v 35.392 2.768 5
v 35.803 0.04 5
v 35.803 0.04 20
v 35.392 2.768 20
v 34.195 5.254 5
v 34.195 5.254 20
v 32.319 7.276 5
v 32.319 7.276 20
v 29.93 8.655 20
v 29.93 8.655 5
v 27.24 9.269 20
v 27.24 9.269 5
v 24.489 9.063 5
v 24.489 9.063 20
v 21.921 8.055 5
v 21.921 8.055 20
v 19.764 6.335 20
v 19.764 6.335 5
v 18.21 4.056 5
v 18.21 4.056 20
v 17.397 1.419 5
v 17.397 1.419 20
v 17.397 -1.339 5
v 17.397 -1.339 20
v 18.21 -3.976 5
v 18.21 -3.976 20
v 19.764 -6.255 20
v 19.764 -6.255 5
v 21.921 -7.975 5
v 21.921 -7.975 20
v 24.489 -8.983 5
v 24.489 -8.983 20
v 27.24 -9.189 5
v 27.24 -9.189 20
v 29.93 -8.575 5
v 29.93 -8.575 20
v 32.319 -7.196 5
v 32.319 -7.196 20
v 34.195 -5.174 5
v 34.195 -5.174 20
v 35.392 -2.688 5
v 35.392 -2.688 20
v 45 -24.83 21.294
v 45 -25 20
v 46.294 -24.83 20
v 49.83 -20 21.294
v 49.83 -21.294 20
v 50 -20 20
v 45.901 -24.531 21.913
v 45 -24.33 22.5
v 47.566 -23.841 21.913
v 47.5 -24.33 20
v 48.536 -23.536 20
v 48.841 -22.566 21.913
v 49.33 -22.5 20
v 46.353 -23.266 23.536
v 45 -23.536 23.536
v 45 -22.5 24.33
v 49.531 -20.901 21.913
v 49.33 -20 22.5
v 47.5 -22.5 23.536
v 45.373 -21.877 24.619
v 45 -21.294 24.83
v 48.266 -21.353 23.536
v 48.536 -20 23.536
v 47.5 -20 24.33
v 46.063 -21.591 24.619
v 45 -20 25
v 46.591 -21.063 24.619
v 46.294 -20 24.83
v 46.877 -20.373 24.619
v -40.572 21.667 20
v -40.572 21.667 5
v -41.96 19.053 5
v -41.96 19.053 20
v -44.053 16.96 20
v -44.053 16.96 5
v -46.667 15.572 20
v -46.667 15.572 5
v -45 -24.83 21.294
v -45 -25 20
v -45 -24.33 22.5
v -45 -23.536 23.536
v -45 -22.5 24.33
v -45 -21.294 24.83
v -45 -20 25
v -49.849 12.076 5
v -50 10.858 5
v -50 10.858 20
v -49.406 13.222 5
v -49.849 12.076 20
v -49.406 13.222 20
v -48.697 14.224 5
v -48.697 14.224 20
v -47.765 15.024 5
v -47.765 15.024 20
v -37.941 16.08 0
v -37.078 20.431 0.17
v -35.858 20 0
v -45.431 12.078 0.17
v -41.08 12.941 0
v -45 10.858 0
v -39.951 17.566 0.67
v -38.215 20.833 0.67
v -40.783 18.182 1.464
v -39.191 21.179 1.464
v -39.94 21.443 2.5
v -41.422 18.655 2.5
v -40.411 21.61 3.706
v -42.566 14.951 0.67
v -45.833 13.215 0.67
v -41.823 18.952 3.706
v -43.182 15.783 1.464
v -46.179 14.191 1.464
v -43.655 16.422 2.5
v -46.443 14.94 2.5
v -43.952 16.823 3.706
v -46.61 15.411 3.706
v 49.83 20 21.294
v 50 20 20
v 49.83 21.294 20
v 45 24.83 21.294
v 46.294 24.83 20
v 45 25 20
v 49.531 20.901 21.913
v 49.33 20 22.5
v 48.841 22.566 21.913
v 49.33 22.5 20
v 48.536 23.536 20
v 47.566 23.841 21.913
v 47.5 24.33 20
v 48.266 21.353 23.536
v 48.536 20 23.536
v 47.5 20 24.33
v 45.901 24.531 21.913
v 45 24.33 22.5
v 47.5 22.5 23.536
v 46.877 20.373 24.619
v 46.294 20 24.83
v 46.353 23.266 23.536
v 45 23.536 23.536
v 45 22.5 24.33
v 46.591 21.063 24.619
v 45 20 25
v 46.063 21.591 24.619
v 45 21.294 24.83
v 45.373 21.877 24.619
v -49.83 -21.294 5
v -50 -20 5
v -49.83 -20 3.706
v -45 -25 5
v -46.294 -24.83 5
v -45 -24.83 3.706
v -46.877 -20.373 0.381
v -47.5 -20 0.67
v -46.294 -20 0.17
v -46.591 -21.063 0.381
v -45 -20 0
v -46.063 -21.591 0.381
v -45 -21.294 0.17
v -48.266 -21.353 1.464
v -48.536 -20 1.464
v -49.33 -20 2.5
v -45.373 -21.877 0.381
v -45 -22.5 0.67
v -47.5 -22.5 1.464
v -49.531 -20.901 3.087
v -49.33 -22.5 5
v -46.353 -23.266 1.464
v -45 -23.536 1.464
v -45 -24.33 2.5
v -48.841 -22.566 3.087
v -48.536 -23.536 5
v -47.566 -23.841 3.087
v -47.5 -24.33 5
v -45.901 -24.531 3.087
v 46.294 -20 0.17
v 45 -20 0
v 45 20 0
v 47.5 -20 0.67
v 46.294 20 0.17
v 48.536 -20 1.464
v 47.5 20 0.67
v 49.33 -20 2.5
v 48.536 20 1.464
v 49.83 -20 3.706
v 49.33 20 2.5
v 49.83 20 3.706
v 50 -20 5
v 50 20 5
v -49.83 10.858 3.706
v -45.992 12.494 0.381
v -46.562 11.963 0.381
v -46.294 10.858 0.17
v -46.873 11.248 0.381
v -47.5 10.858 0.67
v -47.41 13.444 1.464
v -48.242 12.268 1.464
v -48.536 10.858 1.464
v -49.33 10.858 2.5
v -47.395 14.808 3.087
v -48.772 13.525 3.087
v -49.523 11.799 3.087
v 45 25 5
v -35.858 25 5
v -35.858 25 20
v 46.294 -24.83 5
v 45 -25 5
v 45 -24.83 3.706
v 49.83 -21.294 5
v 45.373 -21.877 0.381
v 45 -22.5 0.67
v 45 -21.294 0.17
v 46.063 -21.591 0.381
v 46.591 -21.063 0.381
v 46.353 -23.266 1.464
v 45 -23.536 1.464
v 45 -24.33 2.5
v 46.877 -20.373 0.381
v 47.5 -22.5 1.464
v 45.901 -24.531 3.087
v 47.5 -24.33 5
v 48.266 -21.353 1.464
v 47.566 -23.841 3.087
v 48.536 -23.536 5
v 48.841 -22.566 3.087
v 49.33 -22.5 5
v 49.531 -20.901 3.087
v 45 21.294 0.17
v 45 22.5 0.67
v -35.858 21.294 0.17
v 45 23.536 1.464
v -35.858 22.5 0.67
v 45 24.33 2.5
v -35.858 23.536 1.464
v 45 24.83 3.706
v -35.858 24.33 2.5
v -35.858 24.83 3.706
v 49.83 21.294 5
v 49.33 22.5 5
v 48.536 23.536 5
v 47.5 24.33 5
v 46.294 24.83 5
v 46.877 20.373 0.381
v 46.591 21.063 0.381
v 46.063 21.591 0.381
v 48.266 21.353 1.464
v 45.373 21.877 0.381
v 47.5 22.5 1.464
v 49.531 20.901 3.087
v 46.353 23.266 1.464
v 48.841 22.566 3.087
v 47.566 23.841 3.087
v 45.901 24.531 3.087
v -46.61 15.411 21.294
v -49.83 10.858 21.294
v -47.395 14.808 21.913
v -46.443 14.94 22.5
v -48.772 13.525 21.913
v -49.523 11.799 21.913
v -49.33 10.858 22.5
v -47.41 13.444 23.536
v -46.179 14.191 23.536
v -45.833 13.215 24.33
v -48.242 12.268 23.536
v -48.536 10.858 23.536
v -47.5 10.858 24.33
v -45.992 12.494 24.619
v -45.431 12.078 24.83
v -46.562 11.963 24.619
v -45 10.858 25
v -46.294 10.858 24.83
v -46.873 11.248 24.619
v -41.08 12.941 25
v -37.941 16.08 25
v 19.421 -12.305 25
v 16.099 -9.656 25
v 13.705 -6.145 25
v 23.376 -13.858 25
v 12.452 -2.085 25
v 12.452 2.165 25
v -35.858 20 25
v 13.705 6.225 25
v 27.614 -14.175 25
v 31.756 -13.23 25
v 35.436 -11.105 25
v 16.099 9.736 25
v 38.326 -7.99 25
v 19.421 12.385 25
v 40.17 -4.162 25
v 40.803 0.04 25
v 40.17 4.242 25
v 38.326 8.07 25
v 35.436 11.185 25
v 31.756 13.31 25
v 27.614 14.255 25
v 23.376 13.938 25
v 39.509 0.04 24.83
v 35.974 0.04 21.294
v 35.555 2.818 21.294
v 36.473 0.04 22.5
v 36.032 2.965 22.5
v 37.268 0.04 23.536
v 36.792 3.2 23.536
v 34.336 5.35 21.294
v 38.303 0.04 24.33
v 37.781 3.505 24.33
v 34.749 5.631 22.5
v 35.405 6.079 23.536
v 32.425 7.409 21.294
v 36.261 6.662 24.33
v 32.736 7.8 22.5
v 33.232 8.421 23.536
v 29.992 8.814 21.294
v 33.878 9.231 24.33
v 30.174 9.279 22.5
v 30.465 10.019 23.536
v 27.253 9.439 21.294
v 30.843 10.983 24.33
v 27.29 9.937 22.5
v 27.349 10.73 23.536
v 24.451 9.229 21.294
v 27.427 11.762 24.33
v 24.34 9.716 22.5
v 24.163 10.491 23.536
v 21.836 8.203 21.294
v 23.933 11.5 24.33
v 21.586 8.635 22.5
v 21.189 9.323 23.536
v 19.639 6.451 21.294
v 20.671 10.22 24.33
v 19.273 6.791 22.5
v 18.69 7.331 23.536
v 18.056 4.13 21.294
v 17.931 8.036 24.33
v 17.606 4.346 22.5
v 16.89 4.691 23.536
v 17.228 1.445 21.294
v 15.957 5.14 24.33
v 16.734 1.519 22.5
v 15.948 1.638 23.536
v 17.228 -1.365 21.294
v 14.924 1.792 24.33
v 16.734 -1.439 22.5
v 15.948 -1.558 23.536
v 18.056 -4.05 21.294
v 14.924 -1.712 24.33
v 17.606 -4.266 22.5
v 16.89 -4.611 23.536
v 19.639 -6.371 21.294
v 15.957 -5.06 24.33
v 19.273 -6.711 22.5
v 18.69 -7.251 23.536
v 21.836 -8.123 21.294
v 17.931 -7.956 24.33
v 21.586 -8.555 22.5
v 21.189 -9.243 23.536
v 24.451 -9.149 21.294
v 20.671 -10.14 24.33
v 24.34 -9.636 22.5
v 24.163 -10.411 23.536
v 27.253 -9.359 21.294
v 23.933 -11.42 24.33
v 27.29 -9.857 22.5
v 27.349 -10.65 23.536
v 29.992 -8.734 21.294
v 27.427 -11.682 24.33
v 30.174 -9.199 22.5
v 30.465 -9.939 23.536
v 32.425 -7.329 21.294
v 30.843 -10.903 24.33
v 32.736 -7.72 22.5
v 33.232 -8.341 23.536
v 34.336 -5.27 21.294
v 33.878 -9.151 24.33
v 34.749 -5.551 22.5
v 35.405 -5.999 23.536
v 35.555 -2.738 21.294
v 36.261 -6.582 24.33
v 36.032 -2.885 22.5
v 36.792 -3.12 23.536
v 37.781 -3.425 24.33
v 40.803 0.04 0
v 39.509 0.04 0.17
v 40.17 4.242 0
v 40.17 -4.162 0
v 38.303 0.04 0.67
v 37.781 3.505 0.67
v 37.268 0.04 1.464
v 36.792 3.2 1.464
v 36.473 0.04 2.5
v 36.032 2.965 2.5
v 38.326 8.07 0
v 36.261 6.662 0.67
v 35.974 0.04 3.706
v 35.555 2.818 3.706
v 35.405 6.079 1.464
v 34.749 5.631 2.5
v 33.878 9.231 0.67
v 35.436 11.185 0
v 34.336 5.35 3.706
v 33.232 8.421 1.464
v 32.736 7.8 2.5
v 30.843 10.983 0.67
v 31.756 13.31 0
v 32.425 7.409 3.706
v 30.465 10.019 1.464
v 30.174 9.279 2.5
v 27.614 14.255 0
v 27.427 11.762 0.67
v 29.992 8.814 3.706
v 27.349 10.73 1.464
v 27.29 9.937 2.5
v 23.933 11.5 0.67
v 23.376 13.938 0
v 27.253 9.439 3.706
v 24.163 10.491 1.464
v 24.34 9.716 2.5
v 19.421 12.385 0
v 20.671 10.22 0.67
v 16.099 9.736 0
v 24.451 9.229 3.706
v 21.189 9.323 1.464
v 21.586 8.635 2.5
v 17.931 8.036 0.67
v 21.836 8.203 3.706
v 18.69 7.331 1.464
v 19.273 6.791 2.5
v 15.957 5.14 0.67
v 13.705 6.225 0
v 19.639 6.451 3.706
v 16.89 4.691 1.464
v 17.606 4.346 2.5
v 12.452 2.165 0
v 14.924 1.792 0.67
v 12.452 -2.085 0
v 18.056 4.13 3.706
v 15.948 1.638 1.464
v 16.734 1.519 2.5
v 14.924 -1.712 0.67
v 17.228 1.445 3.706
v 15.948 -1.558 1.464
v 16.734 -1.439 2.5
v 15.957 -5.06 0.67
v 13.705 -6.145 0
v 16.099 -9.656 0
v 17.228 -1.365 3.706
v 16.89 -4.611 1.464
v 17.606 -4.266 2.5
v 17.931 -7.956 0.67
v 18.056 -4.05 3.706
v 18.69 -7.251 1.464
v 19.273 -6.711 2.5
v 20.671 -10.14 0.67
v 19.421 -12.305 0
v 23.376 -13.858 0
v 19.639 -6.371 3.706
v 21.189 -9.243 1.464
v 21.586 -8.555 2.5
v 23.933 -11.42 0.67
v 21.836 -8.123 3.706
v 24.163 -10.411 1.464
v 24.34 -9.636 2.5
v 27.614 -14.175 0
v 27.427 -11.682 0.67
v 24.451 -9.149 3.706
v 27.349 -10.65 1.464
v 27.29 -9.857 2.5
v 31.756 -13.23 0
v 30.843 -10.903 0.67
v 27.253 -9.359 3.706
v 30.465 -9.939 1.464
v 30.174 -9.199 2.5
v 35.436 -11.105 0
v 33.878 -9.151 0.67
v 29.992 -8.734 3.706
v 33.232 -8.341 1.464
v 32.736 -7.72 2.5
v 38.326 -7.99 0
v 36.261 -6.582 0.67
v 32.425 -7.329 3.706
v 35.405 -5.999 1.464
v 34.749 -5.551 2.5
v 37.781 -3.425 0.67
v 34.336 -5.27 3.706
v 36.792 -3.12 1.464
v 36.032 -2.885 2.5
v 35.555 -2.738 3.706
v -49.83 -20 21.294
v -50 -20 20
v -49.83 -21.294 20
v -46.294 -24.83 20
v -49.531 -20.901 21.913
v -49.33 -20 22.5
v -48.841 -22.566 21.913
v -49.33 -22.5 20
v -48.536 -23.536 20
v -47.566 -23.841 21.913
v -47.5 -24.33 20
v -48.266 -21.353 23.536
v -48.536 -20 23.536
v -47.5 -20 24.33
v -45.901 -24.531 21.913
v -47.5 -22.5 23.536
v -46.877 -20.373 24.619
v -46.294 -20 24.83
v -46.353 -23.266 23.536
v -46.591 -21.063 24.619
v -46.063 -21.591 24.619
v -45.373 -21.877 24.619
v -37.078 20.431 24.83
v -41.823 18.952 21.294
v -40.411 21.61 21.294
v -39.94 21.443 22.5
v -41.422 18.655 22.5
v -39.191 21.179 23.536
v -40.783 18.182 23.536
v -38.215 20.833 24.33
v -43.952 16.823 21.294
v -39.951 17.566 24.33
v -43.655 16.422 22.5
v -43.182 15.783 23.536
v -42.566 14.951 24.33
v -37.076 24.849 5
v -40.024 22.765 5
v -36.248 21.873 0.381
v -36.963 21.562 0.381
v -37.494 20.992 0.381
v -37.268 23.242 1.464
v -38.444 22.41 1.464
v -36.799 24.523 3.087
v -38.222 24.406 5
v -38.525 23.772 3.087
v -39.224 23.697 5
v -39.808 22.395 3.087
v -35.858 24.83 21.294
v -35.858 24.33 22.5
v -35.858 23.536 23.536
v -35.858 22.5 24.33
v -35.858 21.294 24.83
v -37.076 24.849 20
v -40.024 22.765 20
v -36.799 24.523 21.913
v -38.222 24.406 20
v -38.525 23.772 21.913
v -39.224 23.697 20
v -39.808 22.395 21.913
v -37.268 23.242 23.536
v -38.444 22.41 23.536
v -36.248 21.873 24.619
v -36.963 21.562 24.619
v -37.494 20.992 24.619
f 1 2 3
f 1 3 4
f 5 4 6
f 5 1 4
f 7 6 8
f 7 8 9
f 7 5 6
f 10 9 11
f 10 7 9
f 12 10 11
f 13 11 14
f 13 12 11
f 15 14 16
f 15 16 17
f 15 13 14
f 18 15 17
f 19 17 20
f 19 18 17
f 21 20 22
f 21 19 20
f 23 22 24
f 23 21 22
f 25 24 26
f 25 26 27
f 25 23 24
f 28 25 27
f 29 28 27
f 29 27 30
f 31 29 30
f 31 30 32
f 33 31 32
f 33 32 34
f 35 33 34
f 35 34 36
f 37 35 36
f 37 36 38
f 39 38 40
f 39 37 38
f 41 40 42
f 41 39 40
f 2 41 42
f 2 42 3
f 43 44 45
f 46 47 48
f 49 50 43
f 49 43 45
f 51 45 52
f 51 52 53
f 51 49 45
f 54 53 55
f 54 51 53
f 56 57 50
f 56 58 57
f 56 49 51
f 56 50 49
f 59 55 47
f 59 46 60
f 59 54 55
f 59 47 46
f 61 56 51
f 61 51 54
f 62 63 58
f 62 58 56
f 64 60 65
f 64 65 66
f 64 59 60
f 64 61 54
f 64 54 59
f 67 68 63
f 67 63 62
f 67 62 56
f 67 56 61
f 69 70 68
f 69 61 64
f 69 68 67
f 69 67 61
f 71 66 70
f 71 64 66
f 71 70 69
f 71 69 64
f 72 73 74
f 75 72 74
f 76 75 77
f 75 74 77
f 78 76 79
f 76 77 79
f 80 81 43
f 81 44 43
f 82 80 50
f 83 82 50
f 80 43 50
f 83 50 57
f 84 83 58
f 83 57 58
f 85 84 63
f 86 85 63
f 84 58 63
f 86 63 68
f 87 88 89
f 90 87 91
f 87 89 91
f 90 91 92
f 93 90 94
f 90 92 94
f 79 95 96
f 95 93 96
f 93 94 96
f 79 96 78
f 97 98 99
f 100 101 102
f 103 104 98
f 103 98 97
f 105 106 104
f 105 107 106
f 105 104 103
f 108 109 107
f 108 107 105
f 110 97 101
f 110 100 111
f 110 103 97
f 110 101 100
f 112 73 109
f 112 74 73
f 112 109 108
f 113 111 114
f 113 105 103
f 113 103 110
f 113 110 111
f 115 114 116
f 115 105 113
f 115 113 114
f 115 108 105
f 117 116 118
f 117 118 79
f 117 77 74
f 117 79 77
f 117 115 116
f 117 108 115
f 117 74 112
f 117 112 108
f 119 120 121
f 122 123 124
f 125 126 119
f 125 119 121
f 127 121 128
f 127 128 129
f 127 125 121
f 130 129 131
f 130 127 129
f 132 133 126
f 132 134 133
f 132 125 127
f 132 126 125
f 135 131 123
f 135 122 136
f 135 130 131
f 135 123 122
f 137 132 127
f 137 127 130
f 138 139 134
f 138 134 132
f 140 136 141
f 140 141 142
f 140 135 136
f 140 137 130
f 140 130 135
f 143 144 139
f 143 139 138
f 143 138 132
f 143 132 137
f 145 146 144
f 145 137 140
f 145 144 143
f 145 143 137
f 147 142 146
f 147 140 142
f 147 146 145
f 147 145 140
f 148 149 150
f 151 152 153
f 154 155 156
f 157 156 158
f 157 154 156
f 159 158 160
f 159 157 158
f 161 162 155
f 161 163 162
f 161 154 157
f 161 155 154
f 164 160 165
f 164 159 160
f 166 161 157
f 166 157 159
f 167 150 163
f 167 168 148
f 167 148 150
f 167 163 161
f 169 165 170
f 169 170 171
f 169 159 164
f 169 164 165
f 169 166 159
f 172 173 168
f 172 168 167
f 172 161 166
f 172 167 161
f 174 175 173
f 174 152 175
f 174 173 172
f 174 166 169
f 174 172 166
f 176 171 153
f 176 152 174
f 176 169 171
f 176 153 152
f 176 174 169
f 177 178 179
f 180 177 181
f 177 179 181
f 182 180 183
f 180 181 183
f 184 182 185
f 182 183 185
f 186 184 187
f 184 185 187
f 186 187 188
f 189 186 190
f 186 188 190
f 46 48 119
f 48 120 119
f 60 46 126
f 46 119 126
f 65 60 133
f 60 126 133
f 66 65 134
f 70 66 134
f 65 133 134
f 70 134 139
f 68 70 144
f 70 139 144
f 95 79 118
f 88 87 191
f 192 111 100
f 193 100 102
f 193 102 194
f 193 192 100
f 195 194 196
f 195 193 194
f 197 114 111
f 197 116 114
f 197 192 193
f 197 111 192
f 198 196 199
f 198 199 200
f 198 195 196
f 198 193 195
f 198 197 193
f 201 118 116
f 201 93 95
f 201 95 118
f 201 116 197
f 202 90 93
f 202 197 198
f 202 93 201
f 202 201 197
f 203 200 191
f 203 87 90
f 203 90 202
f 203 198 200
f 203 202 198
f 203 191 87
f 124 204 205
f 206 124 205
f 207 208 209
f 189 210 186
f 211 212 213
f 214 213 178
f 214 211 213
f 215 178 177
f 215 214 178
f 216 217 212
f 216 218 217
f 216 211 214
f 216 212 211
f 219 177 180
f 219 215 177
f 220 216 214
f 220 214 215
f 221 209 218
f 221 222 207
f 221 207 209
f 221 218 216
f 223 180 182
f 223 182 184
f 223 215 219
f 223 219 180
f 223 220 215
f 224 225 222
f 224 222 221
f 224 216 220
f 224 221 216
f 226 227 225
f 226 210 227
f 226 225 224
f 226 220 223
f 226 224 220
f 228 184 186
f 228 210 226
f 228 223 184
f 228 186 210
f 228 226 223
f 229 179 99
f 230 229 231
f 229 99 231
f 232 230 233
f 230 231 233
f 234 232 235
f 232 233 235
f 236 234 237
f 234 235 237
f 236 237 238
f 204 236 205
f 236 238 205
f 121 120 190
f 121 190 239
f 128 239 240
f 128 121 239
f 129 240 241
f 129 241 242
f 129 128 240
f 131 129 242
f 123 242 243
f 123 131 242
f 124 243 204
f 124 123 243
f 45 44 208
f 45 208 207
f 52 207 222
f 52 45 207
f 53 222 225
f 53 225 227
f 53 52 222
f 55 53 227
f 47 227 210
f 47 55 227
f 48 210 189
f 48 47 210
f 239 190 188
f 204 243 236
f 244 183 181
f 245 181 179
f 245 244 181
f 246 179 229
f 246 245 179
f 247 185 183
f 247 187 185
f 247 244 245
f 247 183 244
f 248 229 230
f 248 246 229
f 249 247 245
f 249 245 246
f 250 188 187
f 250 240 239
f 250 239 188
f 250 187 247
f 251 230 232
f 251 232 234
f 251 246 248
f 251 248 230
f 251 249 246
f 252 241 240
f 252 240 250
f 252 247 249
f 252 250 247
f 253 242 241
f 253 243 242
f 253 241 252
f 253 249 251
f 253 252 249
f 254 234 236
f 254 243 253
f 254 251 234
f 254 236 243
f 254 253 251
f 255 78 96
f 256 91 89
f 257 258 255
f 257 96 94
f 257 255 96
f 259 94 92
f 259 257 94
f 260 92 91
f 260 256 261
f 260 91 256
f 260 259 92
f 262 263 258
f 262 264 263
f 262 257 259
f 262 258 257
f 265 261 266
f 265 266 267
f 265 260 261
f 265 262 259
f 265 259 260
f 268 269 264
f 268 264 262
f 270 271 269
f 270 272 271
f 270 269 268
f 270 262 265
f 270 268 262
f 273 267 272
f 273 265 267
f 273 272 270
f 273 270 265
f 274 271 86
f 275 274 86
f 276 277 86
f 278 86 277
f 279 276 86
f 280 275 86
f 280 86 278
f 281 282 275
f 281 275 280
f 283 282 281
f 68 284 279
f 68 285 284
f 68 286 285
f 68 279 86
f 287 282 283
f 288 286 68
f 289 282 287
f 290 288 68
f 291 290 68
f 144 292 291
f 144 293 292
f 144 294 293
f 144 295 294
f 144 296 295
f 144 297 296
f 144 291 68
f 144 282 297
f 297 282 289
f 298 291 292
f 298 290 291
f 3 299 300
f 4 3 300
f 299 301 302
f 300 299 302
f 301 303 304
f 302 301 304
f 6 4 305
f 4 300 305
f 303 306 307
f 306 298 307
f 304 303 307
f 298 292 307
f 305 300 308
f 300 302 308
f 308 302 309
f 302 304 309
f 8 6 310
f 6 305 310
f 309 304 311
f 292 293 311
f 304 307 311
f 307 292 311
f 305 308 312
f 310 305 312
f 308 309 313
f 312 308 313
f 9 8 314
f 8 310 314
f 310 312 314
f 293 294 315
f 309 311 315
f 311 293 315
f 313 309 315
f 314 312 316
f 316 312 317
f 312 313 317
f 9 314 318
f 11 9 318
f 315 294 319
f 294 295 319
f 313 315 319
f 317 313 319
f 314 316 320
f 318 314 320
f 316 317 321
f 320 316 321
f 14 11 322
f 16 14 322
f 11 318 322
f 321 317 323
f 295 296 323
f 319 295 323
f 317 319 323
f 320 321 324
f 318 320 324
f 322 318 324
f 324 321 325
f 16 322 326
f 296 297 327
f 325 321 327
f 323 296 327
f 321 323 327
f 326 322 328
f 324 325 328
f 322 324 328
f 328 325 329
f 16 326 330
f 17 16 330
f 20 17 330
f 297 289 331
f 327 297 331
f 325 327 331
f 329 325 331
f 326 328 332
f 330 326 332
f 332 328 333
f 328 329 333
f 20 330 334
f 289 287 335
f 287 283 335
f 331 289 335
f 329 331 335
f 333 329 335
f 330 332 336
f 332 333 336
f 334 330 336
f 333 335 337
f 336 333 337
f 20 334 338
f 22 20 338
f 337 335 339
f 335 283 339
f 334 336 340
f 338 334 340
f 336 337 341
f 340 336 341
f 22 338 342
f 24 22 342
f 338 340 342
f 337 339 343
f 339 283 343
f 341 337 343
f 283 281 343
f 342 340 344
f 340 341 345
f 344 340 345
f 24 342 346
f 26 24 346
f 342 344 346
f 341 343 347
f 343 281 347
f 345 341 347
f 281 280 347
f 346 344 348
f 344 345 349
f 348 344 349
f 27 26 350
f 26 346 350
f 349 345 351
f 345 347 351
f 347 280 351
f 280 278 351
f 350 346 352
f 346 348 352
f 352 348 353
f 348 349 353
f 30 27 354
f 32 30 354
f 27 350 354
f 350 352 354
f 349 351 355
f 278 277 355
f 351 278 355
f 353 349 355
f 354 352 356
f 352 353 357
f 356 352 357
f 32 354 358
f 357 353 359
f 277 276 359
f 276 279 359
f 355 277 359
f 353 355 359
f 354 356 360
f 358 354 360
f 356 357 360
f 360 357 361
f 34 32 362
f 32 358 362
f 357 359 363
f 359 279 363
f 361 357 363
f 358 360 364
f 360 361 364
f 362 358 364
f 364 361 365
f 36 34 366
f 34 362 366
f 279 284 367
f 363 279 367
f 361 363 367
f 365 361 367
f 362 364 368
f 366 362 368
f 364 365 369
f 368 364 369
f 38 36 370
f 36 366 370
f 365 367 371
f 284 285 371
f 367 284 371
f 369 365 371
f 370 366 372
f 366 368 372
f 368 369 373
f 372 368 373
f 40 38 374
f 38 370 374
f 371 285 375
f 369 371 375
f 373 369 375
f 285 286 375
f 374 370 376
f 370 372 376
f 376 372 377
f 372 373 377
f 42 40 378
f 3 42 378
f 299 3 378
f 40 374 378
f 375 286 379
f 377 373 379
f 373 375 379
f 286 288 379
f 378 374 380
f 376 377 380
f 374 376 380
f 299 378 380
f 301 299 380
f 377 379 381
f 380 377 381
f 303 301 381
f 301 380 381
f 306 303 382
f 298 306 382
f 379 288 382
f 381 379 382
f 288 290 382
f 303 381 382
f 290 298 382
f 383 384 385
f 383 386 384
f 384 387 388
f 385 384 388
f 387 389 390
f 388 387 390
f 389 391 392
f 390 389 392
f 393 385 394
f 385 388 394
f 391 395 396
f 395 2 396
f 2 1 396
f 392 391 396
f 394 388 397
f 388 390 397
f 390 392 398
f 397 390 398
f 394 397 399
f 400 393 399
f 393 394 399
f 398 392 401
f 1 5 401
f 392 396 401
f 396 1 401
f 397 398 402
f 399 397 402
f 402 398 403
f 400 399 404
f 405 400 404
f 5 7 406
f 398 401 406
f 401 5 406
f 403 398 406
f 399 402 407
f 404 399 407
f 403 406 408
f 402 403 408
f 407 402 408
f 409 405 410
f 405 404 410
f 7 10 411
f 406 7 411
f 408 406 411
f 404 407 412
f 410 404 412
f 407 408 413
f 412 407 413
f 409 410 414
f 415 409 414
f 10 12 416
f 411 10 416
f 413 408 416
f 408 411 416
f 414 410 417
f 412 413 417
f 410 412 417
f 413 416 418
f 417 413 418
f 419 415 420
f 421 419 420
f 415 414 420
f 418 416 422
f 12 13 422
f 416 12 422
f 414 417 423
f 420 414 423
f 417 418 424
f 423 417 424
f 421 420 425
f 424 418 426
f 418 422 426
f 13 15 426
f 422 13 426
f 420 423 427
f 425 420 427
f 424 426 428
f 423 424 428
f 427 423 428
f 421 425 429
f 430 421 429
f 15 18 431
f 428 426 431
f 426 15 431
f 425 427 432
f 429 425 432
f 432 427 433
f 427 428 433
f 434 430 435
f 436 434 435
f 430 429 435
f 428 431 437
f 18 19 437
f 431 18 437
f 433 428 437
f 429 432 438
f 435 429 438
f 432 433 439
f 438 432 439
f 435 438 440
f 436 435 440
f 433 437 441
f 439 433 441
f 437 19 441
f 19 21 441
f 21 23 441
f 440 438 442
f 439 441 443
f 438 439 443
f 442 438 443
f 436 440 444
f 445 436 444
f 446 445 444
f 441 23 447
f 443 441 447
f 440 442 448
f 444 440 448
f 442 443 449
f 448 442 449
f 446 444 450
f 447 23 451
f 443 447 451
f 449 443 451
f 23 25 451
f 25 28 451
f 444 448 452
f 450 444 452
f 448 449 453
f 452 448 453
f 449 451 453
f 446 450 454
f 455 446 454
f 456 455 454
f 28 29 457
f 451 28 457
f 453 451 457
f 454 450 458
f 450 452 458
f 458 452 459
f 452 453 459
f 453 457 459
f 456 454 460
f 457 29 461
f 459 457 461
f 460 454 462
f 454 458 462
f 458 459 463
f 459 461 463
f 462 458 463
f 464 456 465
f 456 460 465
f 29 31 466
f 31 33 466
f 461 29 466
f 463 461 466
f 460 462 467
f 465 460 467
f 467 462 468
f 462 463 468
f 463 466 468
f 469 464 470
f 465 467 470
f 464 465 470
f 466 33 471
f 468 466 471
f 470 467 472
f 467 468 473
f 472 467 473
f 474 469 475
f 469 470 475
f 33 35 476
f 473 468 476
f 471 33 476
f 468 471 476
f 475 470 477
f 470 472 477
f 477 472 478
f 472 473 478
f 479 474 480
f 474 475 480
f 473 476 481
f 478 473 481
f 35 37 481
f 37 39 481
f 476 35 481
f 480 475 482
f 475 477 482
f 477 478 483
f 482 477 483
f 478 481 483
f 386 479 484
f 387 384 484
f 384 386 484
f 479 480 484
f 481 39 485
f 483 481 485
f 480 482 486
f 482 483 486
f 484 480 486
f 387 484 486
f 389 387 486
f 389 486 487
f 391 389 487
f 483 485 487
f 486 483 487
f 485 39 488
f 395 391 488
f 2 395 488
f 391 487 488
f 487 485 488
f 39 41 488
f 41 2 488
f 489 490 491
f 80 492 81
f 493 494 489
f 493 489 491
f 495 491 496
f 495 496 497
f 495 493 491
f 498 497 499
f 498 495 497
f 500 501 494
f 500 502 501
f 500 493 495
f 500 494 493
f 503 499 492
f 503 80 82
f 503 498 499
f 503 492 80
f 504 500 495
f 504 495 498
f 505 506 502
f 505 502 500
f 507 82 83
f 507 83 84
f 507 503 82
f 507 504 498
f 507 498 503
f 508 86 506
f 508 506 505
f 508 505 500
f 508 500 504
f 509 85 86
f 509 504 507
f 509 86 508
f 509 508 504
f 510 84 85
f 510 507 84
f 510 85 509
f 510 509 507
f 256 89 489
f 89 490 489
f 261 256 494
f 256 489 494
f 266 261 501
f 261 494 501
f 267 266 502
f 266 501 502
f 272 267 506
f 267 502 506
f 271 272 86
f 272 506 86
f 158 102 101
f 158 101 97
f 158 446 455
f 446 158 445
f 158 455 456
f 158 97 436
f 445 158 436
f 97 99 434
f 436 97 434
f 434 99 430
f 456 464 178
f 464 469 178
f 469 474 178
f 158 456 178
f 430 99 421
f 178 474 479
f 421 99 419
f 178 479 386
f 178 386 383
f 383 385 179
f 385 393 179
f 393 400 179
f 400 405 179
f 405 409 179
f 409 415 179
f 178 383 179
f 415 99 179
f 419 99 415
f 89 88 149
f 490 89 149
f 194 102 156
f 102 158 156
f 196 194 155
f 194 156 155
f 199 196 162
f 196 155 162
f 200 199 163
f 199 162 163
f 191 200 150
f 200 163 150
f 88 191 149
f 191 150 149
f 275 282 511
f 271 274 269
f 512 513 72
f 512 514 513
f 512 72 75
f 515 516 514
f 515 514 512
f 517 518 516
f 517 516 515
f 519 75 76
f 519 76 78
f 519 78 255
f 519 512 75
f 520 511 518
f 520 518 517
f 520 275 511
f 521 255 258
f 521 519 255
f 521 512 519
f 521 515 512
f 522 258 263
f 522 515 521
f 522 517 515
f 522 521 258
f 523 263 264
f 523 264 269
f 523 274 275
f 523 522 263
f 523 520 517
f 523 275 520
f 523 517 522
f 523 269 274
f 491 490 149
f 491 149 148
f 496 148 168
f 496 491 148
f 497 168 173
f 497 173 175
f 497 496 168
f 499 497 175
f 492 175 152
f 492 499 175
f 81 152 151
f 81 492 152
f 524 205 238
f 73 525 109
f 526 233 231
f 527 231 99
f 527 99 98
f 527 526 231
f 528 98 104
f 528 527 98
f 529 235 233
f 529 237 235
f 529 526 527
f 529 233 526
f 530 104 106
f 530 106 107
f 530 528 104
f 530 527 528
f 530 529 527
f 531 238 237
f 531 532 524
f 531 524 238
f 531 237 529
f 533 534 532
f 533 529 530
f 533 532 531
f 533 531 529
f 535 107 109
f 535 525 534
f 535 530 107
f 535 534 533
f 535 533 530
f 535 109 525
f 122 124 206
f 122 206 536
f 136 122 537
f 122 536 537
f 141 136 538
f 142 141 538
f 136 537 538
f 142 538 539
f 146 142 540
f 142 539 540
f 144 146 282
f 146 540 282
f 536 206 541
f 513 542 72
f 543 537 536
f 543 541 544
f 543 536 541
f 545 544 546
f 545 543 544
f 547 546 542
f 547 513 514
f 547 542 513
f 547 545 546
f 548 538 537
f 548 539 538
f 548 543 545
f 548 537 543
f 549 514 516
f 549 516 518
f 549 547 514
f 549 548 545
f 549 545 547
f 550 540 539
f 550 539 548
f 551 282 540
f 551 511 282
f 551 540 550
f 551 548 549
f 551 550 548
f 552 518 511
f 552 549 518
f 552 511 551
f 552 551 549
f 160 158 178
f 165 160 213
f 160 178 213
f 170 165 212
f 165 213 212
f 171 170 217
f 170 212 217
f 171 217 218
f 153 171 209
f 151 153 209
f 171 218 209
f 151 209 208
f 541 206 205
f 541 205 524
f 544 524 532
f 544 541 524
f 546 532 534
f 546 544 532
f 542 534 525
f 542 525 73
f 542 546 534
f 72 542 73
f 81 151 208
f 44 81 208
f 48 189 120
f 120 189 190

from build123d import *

# Parameters (mm, degrees)
F0_R     = 9.2551404176
F1_DEPTH = 25
F3_F1_R  = 5
F3_F2_R  = 5
F3_F3_R  = 5
F3_F4_R  = 5
F3_F5_R  = 5
F3_F6_R  = 5
F3_F7_R  = 5
F3_F8_R  = 5
F3_F9_R  = 5


# Not quite as in the source:
# - a feature of the source that left no trace in its solid (it failed there, or was rolled back) is left out


with BuildPart() as f1:
    # F0 (on Top) → F1 (new body)
    with BuildSketch(Plane.XY):
        with BuildLine():
            Line((50, -25), (50, 25))
            Line((50, 25), (-40, 25))
            ThreePointArc((-40, 25), (-42.9289321881, 17.9289321881), (-50, 15))
            Line((-50, 15), (-50, -25))
            Line((-50, -25), (50, -25))
        make_face()
        with Locations((26.5483168381, 0.0399786921)):
            Circle(F0_R, mode=Mode.SUBTRACT)
    extrude(amount=F1_DEPTH)

    # F3: fillet of radius 5 on 15 edges, made by hand

    # F3_f1
    f3_f1_edges = [f1.edges().sort_by_distance(p)[0] for p in [
        (-50, 15, 12.5),
    ]]
    fillet(f3_f1_edges, radius=F3_F1_R)

    # F3_f2
    f3_f2_edges = [f1.edges().sort_by_distance(p)[0] for p in [
        (-50, -25, 12.5),
    ]]
    fillet(f3_f2_edges, radius=F3_F2_R)

    # F3_f3
    f3_f3_edges = [f1.edges().sort_by_distance(p)[0] for p in [
        (50, -25, 12.5),
    ]]
    fillet(f3_f3_edges, radius=F3_F3_R)

    # F3_f4
    f3_f4_edges = [f1.edges().sort_by_distance(p)[0] for p in [
        (50, 25, 12.5),
    ]]
    fillet(f3_f4_edges, radius=F3_F4_R)

    # F3_f5
    f3_f5_edges = [f1.edges().sort_by_distance(p)[0] for p in [
        (-40, 25, 12.5),
    ]]
    fillet(f3_f5_edges, radius=F3_F5_R)

    # F3_f6
    f3_f6_edges = [f1.edges().sort_by_distance(p)[0] for p in [
        (-50, -4.5710678119, 0),
    ]]
    fillet(f3_f6_edges, radius=F3_F6_R)

    # F3_f7
    f3_f7_edges = [f1.edges().sort_by_distance(p)[0] for p in [
        (-50, -4.5710678119, 25),
    ]]
    fillet(f3_f7_edges, radius=F3_F7_R)

    # F3_f8
    f3_f8_edges = [f1.edges().sort_by_distance(p)[0] for p in [
        (17.2931764204, 0.0399786921, 0),
    ]]
    fillet(f3_f8_edges, radius=F3_F8_R)

    # F3_f9
    f3_f9_edges = [f1.edges().sort_by_distance(p)[0] for p in [
        (17.2931764204, 0.0399786921, 25),
    ]]
    fillet(f3_f9_edges, radius=F3_F9_R)


solid = f1.part
